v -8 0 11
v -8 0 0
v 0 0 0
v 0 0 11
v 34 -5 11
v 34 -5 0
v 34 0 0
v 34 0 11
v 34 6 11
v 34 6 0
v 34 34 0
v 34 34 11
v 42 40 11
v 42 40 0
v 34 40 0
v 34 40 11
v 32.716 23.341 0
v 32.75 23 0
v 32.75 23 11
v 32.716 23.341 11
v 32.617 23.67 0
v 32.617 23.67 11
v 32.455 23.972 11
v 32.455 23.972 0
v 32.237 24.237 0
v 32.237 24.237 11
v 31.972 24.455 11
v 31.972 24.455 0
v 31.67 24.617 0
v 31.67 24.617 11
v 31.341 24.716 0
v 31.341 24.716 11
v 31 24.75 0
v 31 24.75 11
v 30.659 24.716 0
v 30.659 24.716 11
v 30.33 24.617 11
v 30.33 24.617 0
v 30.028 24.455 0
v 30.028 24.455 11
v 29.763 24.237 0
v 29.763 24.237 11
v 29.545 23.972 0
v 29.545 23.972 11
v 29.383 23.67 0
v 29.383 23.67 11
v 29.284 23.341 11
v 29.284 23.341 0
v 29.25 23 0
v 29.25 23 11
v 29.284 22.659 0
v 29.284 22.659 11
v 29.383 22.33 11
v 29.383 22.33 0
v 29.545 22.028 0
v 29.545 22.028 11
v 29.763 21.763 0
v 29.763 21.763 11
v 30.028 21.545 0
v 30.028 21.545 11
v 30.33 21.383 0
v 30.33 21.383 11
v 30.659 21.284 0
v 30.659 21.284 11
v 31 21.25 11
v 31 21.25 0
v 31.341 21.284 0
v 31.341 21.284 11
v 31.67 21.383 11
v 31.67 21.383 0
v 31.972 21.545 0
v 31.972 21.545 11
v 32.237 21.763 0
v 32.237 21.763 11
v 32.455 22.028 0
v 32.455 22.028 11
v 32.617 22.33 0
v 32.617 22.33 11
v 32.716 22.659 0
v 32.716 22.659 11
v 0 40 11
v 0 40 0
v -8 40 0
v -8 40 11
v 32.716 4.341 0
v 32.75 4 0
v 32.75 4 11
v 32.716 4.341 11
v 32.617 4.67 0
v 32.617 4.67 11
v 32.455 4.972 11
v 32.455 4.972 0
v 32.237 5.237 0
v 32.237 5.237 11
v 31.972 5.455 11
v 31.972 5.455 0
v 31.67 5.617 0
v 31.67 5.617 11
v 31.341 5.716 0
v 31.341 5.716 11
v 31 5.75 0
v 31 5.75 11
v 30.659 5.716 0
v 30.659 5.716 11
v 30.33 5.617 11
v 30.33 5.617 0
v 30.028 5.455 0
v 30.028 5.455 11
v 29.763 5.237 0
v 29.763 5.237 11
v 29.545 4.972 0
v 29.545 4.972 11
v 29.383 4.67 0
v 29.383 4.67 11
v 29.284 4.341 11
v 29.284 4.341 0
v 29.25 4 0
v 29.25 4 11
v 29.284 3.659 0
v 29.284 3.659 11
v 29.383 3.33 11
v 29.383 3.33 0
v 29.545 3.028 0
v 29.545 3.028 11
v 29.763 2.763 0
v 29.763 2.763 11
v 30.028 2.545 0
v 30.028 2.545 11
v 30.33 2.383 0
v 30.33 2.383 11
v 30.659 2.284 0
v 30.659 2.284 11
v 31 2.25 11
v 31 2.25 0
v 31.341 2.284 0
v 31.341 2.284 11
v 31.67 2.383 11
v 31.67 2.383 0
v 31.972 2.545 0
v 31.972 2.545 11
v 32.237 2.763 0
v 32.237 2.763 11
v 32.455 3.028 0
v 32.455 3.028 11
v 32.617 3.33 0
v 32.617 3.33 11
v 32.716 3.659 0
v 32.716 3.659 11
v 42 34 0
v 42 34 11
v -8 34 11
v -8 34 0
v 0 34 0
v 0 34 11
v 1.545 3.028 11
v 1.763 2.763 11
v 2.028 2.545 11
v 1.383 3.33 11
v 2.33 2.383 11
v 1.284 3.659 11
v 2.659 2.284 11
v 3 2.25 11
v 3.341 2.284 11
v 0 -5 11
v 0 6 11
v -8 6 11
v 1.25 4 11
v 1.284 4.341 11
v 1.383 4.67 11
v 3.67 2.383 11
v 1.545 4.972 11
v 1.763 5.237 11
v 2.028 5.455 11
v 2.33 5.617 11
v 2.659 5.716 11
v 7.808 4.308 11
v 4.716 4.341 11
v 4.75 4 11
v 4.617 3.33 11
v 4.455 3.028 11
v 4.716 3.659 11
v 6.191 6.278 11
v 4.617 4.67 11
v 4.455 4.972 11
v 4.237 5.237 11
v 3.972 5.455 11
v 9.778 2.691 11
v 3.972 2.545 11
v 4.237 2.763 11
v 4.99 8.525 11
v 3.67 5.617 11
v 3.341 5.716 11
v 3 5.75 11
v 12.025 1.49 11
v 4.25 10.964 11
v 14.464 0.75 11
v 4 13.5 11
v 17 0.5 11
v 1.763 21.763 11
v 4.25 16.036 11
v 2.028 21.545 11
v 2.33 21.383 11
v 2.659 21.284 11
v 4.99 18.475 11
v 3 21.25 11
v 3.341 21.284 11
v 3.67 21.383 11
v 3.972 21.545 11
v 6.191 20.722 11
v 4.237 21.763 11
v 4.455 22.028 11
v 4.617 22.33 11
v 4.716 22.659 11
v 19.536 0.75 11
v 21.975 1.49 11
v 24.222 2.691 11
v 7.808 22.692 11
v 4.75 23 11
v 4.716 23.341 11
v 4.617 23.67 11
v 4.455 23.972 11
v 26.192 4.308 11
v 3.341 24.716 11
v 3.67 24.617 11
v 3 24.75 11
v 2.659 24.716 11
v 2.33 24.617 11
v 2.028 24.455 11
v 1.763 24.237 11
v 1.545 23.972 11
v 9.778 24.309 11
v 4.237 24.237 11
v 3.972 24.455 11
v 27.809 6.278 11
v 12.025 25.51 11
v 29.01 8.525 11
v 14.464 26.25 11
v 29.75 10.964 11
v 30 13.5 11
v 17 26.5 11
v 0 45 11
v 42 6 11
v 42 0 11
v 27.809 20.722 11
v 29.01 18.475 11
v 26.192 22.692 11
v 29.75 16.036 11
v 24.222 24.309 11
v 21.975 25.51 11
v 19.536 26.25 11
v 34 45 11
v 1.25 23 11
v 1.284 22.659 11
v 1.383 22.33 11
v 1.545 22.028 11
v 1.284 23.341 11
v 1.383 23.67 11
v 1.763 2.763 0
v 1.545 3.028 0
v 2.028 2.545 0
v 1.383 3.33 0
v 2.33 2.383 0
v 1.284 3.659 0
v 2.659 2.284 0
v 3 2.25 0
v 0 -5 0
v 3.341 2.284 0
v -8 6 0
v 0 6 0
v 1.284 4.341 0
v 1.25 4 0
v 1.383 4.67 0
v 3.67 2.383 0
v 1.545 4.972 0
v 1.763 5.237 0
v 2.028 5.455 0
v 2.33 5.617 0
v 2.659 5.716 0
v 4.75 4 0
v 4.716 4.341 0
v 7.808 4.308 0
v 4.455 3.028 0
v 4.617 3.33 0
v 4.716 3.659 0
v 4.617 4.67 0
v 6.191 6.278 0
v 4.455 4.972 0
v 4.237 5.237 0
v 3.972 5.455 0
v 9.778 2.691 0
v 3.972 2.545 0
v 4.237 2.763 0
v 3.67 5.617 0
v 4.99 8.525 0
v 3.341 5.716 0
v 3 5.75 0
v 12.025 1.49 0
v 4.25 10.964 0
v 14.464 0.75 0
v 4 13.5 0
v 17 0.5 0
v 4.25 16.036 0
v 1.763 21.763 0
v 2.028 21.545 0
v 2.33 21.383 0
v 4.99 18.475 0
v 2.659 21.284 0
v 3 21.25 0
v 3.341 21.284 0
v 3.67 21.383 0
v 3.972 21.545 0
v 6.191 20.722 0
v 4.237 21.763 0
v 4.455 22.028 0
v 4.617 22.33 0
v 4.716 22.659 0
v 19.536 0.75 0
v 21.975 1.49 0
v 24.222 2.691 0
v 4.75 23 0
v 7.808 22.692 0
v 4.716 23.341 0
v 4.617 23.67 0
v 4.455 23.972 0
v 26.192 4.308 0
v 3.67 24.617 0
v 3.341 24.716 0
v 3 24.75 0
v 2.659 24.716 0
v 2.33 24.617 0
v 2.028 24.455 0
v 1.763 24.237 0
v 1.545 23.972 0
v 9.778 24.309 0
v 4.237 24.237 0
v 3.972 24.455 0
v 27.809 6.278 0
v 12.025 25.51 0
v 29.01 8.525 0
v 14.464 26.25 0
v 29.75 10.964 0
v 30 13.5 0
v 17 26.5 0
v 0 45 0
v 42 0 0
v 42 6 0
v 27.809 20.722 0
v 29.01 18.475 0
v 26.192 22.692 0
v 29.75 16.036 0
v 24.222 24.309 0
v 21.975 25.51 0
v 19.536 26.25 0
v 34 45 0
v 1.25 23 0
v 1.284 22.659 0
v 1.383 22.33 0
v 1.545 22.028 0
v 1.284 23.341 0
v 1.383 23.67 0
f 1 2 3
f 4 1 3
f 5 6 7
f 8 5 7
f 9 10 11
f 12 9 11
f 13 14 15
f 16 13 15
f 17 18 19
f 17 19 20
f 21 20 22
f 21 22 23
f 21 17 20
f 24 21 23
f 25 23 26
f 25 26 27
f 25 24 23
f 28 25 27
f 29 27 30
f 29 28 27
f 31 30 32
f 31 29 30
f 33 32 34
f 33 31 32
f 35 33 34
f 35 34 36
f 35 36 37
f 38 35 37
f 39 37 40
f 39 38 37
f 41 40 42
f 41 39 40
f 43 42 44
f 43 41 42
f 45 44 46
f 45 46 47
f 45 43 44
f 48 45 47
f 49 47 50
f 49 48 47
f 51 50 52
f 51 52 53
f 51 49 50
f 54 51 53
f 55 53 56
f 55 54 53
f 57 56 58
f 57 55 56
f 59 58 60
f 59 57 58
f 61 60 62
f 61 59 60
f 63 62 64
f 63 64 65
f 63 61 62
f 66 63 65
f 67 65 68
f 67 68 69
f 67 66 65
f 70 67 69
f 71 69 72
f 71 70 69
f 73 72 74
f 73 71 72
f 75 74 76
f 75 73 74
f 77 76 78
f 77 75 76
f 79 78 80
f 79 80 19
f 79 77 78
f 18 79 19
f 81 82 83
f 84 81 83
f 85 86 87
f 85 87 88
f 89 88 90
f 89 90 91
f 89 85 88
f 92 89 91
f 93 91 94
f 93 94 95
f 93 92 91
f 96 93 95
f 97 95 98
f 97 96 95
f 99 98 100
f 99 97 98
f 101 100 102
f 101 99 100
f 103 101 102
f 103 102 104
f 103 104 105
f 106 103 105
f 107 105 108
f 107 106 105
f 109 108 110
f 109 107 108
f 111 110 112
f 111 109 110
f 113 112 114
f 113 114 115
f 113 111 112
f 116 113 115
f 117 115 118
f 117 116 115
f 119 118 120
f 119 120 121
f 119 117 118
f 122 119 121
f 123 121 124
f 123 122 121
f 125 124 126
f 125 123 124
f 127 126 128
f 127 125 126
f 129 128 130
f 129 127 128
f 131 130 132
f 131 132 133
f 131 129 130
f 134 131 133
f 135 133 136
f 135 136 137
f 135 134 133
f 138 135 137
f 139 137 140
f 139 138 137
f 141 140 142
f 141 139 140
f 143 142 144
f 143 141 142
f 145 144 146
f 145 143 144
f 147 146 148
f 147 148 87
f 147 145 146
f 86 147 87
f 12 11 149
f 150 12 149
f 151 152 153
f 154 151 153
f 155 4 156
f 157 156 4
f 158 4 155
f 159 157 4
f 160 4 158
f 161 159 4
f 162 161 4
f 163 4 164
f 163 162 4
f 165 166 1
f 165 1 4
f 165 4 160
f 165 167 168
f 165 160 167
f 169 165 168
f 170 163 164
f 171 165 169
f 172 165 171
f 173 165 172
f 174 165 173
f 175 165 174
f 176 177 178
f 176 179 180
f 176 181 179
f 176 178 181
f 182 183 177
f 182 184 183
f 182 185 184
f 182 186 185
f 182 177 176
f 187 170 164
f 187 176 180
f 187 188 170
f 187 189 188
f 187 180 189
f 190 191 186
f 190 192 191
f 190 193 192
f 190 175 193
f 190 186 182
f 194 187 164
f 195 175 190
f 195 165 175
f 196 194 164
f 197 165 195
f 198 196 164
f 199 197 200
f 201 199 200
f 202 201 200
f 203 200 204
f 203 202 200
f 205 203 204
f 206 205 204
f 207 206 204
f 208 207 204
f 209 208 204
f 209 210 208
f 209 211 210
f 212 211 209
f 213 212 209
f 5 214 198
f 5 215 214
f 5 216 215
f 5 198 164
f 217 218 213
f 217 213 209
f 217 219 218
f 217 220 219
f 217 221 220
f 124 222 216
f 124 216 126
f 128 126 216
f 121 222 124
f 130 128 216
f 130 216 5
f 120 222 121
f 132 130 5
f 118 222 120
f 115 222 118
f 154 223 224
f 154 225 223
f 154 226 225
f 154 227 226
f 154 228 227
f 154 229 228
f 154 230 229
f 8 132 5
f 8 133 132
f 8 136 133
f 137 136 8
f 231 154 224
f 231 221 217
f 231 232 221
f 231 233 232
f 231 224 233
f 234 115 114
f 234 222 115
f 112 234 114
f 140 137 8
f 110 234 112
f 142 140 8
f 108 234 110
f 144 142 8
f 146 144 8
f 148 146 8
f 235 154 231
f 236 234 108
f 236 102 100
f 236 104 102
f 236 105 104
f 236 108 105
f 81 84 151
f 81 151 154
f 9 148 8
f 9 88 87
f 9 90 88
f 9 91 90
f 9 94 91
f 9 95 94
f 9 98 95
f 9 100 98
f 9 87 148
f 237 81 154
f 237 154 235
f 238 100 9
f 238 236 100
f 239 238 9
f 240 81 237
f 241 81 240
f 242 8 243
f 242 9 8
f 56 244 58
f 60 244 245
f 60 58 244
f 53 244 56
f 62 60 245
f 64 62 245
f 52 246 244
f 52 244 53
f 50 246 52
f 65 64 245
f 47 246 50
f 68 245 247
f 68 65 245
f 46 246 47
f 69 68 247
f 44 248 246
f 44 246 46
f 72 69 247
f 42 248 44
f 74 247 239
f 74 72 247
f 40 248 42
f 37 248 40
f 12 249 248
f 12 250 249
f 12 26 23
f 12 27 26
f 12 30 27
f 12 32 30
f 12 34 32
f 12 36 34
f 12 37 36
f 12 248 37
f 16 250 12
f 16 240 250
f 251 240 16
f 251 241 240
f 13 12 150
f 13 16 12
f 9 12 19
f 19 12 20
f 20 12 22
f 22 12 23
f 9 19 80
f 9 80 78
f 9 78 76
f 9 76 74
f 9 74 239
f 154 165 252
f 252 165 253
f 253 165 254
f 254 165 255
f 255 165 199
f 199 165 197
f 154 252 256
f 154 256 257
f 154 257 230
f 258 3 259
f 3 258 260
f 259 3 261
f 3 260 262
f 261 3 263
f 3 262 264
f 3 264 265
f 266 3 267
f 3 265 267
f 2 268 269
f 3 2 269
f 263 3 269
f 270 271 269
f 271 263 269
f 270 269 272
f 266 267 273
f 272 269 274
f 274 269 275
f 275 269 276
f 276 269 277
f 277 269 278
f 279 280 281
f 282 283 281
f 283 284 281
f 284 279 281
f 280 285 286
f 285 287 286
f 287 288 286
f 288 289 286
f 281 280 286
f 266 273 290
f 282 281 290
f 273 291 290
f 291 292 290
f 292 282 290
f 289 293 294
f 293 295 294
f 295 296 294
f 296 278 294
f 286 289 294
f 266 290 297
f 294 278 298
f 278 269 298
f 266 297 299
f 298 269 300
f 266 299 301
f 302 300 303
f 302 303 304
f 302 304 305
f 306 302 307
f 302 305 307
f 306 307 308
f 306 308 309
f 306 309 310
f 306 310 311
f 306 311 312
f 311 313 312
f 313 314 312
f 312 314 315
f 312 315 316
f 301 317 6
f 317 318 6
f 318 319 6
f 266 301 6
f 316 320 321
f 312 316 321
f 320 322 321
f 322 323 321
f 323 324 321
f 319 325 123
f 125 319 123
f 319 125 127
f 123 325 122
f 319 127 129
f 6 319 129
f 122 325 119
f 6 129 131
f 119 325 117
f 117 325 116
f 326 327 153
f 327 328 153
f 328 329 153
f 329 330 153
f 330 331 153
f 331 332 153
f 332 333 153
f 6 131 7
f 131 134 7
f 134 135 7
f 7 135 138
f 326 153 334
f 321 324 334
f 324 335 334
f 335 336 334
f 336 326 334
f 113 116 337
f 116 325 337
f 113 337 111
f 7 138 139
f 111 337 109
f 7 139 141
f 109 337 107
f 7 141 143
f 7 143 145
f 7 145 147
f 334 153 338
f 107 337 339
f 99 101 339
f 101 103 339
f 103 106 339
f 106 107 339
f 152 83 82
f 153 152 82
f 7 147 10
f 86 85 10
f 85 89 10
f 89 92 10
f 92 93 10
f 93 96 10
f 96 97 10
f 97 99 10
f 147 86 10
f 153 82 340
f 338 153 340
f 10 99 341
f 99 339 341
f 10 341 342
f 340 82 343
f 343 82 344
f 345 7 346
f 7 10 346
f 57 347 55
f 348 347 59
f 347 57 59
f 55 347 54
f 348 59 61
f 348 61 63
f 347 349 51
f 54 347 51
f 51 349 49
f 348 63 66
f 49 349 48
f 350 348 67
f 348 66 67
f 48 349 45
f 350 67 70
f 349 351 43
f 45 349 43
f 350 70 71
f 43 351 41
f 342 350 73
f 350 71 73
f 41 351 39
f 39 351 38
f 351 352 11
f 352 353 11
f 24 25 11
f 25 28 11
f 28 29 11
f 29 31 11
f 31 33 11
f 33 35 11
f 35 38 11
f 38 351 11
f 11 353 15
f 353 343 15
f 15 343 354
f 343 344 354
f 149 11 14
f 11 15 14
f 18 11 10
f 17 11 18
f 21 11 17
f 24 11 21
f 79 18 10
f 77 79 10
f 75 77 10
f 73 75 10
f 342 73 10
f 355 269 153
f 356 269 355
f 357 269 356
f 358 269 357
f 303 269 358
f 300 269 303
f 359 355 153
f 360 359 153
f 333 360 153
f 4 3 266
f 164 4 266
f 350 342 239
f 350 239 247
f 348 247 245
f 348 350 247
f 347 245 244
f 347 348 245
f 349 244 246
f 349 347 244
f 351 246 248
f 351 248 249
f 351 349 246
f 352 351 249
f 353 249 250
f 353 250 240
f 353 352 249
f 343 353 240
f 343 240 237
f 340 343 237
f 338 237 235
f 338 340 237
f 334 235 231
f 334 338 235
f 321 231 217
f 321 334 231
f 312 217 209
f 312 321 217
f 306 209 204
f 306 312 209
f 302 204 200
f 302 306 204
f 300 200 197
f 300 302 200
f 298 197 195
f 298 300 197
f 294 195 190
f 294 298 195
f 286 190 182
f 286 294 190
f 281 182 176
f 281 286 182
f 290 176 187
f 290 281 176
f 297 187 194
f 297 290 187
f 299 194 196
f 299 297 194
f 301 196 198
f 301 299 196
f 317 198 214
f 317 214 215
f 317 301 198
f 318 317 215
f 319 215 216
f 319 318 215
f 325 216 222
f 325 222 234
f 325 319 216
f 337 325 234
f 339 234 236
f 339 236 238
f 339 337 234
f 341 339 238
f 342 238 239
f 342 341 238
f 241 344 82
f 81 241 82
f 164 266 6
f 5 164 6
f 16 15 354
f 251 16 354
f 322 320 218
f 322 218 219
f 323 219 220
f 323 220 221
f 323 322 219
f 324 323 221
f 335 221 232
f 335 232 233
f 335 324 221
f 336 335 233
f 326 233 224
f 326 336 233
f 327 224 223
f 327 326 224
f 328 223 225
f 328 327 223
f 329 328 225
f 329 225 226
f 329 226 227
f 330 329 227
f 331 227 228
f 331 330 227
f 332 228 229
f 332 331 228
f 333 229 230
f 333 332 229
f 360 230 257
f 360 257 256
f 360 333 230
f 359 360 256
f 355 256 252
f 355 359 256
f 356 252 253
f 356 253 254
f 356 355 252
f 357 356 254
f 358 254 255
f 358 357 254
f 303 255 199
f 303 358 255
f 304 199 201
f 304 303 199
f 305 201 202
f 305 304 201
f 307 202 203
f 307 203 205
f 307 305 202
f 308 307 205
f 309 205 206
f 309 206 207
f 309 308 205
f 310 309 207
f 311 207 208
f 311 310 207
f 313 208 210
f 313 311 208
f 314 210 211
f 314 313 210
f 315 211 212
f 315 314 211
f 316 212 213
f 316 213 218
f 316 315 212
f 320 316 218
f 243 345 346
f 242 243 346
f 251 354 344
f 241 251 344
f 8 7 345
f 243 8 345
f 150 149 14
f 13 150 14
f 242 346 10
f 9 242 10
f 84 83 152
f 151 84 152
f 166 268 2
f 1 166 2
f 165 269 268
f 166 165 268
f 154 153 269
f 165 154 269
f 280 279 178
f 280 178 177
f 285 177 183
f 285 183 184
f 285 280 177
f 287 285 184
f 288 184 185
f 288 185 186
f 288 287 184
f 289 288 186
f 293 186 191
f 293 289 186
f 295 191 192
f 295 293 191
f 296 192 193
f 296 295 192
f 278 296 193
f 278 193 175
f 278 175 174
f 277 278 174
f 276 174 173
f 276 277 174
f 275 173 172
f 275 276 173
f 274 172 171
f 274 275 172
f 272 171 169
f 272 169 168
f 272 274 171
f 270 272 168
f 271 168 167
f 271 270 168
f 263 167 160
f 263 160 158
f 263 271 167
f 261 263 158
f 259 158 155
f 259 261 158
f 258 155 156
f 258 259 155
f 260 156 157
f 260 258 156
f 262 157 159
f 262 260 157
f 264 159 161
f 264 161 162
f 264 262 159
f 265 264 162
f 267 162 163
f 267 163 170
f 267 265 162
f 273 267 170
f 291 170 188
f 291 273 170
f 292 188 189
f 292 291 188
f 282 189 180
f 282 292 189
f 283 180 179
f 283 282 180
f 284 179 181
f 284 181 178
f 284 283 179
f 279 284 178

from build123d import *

# Parameters (mm, degrees)
ESQUISSE1_R        = 13
ESQUISSE1_R_2      = 1.75
BOSS_EXTRU_1_DEPTH = 11


with BuildPart() as part:
    # Esquisse1 → Boss.-Extru.1 (new body)
    with BuildSketch(Plane.XY):
        Polygon((0, 25), (0, 6), (-8, 6), (-8, 0), (0, 0), (0, -5), (34, -5), (34, 0), (42, 0), (42, 6), (34, 6), (34, 25), (34, 34), (42, 34), (42, 40), (34, 40), (34, 45), (0, 45), (0, 40), (-8, 40), (-8, 34), (0, 34), align=None)
        with Locations((17, 13.5)):
            Circle(ESQUISSE1_R, mode=Mode.SUBTRACT)
        with Locations((3, 23)):
            Circle(ESQUISSE1_R_2, mode=Mode.SUBTRACT)
        with Locations((31, 23)):
            Circle(ESQUISSE1_R_2, mode=Mode.SUBTRACT)
        with Locations((31, 4)):
            Circle(ESQUISSE1_R_2, mode=Mode.SUBTRACT)
        with Locations((3, 4)):
            Circle(ESQUISSE1_R_2, mode=Mode.SUBTRACT)
    extrude(amount=BOSS_EXTRU_1_DEPTH)


solid = part.part
